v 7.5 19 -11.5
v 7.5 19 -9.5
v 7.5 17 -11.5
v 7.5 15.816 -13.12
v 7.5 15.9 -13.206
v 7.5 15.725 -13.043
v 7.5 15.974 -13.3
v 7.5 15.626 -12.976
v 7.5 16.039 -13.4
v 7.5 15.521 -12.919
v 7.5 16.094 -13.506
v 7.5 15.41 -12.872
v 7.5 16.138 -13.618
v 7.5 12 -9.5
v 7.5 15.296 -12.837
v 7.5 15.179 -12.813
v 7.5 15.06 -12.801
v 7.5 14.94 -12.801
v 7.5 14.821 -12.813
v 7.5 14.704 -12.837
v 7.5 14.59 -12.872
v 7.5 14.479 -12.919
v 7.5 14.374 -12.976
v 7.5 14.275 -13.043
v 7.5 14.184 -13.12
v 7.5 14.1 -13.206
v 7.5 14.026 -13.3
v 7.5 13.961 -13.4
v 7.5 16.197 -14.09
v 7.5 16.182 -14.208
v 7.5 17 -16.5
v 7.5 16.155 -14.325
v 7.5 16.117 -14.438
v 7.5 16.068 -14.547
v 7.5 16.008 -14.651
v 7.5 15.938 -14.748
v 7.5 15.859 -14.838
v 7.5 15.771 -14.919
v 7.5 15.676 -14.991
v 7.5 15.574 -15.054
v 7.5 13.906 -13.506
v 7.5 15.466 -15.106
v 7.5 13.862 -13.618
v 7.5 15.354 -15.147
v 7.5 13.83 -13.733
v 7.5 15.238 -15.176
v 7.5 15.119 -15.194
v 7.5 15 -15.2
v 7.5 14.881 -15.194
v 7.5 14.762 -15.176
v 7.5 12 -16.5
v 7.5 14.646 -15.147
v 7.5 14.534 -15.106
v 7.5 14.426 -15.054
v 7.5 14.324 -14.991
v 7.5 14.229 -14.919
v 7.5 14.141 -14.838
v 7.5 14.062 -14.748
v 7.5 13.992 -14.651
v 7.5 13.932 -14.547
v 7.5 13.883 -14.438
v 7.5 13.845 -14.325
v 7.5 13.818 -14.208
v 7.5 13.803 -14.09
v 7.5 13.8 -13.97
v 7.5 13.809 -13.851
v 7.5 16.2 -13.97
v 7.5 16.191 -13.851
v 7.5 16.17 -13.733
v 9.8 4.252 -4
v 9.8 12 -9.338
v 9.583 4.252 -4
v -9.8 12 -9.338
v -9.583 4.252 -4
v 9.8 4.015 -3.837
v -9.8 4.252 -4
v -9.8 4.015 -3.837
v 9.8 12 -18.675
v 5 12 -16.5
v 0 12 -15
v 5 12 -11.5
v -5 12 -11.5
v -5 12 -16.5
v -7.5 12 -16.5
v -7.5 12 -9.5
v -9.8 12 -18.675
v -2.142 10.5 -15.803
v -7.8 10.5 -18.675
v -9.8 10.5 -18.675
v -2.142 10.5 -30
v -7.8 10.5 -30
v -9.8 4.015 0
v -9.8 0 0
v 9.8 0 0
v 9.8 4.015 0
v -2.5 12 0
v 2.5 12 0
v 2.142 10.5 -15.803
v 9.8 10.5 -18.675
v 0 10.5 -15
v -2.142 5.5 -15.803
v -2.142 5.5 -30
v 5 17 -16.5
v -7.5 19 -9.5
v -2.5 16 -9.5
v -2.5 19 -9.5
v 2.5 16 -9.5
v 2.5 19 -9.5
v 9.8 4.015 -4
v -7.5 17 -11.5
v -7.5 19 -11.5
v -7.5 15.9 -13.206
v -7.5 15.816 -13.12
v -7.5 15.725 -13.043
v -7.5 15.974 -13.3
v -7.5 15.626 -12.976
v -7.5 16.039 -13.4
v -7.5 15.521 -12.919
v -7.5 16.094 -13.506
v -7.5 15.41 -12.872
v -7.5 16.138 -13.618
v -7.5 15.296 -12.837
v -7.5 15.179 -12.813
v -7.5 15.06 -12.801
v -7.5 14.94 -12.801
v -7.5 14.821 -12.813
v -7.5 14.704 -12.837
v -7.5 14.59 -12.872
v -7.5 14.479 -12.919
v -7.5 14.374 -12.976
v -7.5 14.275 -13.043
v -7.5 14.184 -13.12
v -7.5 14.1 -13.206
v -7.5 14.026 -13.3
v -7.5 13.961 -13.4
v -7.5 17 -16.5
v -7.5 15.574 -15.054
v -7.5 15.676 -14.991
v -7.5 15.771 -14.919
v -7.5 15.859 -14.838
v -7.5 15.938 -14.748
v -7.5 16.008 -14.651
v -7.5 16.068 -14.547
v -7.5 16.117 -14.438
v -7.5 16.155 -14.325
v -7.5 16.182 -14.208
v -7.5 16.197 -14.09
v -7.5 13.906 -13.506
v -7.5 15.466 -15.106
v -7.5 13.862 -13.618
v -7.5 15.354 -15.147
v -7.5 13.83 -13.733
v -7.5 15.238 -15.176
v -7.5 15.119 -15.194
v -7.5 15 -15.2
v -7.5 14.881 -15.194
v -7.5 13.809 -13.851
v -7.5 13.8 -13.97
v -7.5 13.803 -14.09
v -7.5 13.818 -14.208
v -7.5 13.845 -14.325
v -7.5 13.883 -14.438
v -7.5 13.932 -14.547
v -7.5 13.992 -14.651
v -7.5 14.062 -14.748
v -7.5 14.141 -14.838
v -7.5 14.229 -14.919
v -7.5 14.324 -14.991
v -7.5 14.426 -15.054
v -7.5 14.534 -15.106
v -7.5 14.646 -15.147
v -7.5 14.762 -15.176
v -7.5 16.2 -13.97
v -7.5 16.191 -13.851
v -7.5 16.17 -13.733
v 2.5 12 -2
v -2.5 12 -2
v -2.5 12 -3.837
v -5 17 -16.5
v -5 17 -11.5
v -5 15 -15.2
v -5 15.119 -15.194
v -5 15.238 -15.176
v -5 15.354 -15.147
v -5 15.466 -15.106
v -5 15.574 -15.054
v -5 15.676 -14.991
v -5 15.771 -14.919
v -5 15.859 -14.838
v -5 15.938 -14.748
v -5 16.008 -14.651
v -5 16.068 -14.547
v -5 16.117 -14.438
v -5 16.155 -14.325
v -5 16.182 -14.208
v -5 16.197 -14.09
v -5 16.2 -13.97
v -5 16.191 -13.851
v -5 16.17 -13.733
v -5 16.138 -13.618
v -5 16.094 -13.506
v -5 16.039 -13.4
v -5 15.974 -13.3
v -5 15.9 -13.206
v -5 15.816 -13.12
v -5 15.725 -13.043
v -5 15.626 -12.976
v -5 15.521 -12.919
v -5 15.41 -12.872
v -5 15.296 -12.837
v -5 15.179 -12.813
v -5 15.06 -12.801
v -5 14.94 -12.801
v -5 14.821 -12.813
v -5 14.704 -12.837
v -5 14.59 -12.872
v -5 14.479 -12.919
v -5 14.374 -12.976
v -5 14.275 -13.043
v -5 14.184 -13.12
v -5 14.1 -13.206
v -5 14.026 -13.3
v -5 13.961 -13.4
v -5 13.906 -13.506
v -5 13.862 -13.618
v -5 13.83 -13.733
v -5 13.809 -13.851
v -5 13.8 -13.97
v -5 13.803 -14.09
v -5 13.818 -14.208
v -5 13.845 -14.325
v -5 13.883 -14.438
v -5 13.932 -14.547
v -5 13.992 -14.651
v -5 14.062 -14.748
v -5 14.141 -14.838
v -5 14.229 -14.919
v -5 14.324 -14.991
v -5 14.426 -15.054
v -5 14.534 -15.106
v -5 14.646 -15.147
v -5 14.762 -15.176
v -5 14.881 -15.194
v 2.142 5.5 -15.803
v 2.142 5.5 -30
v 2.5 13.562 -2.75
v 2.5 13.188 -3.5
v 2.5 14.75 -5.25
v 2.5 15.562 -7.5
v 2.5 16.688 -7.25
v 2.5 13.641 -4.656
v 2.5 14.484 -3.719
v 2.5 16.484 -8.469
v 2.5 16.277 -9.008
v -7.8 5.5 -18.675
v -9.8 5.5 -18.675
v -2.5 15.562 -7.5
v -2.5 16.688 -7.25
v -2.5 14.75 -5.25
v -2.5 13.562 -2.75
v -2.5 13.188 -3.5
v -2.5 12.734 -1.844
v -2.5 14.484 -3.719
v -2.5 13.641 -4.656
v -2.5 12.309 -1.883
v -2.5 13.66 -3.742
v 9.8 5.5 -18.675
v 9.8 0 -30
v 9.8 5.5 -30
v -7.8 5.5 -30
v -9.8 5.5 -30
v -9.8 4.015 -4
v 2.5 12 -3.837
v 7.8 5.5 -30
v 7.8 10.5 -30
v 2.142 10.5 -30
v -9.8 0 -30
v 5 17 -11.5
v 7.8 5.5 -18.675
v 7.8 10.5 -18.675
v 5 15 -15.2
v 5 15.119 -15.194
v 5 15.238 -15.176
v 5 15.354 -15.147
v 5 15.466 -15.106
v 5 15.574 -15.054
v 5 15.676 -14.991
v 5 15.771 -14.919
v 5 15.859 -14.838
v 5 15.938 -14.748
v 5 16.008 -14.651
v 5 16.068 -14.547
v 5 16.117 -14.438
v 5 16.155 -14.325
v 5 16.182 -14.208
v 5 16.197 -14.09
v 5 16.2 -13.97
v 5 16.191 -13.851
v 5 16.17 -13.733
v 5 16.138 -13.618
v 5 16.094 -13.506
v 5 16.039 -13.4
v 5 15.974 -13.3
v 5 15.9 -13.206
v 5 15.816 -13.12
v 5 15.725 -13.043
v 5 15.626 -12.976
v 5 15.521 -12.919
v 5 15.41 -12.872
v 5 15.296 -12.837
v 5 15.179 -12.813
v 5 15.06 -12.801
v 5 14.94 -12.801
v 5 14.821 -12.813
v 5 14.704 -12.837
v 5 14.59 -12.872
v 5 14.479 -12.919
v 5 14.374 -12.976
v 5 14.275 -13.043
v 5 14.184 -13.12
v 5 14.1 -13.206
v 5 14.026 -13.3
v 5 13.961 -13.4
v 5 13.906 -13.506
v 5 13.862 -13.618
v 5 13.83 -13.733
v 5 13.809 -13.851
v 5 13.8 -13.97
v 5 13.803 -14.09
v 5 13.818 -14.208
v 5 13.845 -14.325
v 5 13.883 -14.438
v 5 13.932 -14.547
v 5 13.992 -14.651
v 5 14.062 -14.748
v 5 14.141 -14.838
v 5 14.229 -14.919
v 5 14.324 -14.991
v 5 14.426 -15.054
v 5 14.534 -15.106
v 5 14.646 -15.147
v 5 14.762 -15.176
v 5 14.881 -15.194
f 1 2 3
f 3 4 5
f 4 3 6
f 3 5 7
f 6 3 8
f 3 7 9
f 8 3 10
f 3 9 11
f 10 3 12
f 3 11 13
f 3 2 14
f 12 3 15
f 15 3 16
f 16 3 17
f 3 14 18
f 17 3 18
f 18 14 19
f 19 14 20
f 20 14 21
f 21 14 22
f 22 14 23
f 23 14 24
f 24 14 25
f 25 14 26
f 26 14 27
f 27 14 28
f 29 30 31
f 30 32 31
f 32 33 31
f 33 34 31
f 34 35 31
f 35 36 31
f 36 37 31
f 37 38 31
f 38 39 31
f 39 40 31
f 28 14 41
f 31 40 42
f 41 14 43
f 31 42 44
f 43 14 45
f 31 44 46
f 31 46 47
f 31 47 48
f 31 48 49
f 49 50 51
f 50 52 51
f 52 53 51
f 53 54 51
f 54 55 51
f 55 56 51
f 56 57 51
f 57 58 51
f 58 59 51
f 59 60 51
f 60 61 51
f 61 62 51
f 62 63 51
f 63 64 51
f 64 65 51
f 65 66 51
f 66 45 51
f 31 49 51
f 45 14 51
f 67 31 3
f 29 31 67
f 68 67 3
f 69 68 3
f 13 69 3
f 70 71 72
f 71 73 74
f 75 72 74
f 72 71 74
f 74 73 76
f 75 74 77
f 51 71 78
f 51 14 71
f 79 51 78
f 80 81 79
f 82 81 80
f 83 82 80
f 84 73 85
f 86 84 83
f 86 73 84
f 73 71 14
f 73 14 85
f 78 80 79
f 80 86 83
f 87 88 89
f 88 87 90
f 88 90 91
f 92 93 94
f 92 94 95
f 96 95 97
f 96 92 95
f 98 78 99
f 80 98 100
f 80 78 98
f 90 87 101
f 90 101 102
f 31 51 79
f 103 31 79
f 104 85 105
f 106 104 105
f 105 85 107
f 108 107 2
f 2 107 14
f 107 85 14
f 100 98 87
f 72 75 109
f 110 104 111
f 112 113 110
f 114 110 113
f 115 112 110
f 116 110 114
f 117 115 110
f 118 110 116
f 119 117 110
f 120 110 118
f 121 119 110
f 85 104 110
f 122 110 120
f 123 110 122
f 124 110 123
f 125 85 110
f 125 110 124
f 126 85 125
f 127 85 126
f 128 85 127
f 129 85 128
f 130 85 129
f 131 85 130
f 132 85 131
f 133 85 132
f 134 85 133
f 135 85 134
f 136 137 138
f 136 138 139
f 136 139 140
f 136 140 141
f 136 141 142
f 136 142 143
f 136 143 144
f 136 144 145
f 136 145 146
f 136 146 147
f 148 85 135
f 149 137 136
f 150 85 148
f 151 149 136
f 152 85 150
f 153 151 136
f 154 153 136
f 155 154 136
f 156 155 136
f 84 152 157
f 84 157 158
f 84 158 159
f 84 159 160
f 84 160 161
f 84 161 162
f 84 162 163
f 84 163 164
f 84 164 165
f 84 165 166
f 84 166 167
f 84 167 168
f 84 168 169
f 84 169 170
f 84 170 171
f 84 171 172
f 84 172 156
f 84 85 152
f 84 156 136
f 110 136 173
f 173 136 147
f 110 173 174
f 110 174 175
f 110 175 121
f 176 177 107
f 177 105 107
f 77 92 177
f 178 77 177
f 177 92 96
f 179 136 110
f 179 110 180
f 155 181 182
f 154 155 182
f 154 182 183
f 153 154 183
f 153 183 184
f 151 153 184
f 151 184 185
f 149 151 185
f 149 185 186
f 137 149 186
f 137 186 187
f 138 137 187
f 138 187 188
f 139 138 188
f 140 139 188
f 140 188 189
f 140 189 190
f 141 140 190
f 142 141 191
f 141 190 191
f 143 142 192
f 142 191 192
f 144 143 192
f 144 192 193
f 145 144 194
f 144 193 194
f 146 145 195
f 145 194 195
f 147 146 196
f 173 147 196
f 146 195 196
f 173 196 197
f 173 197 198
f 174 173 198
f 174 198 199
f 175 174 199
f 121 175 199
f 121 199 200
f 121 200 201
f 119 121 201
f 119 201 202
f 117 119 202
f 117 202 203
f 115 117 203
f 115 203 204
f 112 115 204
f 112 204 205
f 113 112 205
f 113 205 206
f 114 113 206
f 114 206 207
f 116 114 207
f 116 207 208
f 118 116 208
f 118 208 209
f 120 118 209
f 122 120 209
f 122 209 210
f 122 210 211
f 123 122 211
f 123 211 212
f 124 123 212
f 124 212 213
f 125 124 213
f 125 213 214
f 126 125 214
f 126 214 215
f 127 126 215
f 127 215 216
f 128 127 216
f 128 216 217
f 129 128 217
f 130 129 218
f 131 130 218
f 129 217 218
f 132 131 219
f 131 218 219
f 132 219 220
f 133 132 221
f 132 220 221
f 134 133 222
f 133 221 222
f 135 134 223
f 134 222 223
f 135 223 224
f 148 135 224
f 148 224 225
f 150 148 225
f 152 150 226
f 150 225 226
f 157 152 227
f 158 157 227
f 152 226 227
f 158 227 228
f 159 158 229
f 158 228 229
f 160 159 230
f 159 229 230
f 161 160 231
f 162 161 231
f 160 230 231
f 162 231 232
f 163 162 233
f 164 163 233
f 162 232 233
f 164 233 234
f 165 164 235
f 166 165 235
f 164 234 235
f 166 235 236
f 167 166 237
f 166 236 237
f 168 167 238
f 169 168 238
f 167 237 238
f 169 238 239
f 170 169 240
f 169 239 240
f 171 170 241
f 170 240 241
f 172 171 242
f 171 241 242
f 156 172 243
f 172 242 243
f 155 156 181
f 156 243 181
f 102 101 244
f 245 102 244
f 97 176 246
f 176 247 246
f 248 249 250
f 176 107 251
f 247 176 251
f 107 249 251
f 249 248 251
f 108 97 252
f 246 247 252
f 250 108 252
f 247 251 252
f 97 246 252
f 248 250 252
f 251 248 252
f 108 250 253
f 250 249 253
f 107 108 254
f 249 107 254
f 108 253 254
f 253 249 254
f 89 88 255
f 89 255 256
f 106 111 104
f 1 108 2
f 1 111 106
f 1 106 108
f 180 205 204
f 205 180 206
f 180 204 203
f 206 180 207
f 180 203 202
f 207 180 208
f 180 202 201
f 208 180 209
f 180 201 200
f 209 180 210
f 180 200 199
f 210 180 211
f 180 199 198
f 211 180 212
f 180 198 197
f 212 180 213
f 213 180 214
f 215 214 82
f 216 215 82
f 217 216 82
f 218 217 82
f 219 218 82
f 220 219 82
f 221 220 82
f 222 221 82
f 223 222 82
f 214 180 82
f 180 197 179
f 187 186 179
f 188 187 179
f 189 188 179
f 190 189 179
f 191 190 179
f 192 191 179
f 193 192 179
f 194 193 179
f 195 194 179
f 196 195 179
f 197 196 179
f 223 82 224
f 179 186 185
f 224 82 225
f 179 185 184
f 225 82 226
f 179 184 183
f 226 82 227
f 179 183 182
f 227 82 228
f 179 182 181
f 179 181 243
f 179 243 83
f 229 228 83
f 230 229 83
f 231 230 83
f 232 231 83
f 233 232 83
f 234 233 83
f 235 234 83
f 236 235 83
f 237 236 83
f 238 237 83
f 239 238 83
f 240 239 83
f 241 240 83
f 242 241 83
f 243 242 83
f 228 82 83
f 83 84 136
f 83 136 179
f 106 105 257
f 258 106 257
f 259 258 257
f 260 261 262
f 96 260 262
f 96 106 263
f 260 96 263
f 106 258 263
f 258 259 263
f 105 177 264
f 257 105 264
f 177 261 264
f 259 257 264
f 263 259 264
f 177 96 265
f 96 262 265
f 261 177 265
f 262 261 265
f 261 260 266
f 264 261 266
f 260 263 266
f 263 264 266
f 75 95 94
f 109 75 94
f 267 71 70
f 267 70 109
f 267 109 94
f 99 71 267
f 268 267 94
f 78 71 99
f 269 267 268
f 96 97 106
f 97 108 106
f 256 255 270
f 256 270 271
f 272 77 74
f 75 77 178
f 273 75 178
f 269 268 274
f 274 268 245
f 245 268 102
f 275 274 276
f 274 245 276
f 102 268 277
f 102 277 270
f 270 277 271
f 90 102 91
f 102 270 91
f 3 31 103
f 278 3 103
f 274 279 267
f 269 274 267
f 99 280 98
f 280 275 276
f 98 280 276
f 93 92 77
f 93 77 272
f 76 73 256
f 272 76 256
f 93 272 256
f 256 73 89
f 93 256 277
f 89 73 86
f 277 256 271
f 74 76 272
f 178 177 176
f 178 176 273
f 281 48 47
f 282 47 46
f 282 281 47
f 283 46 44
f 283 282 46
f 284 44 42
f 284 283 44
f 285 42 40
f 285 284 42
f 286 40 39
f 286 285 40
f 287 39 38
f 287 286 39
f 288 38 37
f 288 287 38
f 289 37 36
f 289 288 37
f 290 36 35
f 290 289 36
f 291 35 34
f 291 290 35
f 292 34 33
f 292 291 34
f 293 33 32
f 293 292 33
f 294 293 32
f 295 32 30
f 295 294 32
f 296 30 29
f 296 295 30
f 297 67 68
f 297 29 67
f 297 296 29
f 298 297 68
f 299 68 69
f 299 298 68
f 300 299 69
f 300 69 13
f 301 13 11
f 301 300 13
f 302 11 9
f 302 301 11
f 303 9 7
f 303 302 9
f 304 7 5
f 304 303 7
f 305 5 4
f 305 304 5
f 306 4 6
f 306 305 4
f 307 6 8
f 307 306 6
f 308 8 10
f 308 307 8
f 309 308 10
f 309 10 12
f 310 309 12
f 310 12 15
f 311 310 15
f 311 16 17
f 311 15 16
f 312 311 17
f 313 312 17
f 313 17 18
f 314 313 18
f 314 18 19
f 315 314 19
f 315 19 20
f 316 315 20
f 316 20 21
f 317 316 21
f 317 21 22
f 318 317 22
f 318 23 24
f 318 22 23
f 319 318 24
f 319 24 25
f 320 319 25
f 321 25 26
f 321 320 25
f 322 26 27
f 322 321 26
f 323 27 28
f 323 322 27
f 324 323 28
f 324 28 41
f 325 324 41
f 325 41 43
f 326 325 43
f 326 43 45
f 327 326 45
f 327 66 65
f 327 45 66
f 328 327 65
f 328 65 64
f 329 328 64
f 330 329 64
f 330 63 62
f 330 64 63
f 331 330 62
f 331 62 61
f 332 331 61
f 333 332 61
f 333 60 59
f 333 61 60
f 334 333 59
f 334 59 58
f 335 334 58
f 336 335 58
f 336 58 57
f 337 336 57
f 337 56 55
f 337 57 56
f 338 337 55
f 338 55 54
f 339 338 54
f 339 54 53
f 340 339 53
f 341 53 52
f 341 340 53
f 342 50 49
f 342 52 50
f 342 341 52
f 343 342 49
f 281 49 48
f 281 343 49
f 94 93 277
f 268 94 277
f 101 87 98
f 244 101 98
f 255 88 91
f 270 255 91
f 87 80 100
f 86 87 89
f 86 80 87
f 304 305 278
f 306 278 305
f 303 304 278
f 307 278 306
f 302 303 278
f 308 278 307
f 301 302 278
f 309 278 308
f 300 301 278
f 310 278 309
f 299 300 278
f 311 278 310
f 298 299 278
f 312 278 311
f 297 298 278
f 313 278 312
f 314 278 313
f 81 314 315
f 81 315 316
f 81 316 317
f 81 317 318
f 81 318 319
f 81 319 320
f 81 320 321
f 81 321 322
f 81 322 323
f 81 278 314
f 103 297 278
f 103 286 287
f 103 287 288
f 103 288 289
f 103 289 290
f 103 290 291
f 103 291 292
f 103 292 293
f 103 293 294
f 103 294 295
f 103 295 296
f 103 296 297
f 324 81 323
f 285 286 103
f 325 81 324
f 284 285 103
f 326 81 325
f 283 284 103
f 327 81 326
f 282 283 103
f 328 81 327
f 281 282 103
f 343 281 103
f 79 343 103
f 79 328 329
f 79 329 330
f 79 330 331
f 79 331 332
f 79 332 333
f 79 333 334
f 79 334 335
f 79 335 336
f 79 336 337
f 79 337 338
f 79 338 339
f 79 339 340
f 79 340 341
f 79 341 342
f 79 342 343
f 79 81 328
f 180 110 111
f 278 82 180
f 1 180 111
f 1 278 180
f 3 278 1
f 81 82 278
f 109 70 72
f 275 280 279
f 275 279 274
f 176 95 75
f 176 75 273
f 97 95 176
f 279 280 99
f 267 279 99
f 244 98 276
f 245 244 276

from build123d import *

# Parameters (mm, degrees)
BOSS_EXTRUDE2_DEPTH      = 10
BOSS_EXTRUDE2_DEPTH_BACK = 10
SKETCH2_W                = 30
SKETCH2_H                = 12
SKETCH11_W               = 2.5
SKETCH11_H               = 5
BOSS_EXTRUDE5_DEPTH      = 5
SKETCH12_R               = 1.2
CUT_EXTRUDE3_DEPTH       = 5
SKETCH13_W               = 15
SKETCH13_H               = 2
BOSS_EXTRUDE6_DEPTH      = 7
SKETCH16_W               = 30
SKETCH16_H               = 12
CUT_EXTRUDE4_DEPTH       = 0.2
CUT_EXTRUDE5_DEPTH       = 1.5
CUT_EXTRUDE6_DEPTH       = 31
SKETCH23_W               = 4.283577098
SKETCH23_H               = 14.196829294
CUT_EXTRUDE7_DEPTH       = 5
SKETCH24_W               = 2
SKETCH24_H               = 11.325
CUT_EXTRUDE8_DEPTH       = 5
CUT_EXTRUDE9_DEPTH       = 4


with BuildPart() as part:
    # Sketch2 → Boss-Extrude2 (new, two sides: drawn at the far end of the back side and taken through both)
    with BuildSketch(Plane(origin=(0, 0, 0), x_dir=(0, 0, -1), z_dir=(1, 0, 0)).offset(-BOSS_EXTRUDE2_DEPTH_BACK)):
        with Locations((15, 6)):
            Rectangle(SKETCH2_W, SKETCH2_H)
    extrude(amount=BOSS_EXTRUDE2_DEPTH + BOSS_EXTRUDE2_DEPTH_BACK)

    # Sketch11 → Boss-Extrude5 (add)
    with BuildSketch(Plane(origin=(0, 12, 0), x_dir=(1, 0, 0), z_dir=(0, 1, 0))):
        with Locations((-6.25, 14)):
            Rectangle(SKETCH11_W, SKETCH11_H)
    boss_extrude5 = extrude(amount=BOSS_EXTRUDE5_DEPTH)

    # Sketch12 → Cut-Extrude3 (cut)
    with BuildSketch(Plane(origin=(-5, 0, 0), x_dir=(0, 0, -1), z_dir=(1, 0, 0))):
        with Locations((14, 15)):
            Circle(SKETCH12_R)
    cut_extrude3 = extrude(amount=-CUT_EXTRUDE3_DEPTH, mode=Mode.SUBTRACT)

    # Mirror2: Boss-Extrude5, Cut-Extrude3 across plane
    add(boss_extrude5.mirror(Plane.ZY))
    add(cut_extrude3.mirror(Plane.ZY), mode=Mode.SUBTRACT)

    # Sketch13 → Boss-Extrude6 (add)
    with BuildSketch(Plane(origin=(0, 12, 0), x_dir=(1, 0, 0), z_dir=(0, 1, 0))):
        with Locations((0, 10.5)):
            Rectangle(SKETCH13_W, SKETCH13_H)
    extrude(amount=BOSS_EXTRUDE6_DEPTH)

    # Sketch16 → Cut-Extrude4 (cut)
    with BuildSketch(Plane(origin=(10, 0, 0), x_dir=(0, 0, -1), z_dir=(1, 0, 0))):
        with Locations((15, 6)):
            Rectangle(SKETCH16_W, SKETCH16_H)
    cut_extrude4 = extrude(amount=-CUT_EXTRUDE4_DEPTH, mode=Mode.SUBTRACT)

    # Mirror3: Cut-Extrude4 across plane
    add(cut_extrude4.mirror(Plane.ZY), mode=Mode.SUBTRACT)

    # Sketch5 → Cut-Extrude5 (cut)
    with BuildSketch(Plane(origin=(0, 12, 0), x_dir=(1, 0, 0), z_dir=(0, 1, 0))):
        Polygon((-10, 18.75), (-10, 30), (10, 30), (10, 18.75), (0, 15), align=None)
    extrude(amount=-CUT_EXTRUDE5_DEPTH, mode=Mode.SUBTRACT)

    # Sketch20 → Loft1 section 0
    with BuildSketch(Plane(origin=(0, 12, 0), x_dir=(1, 0, 0), z_dir=(0, 1, 0))):
        with BuildLine():
            Line((-2.5, 2), (2.5, 2))
            Line((2.5, 2), (2.5, 0))
            Line((2.5, 0), (-2.5, 0))
            Line((-2.5, 0), (-2.5, 2))
        make_face()
    # Sketch19 → Loft1 section 1
    with BuildSketch(Plane.XY.offset(-9.5)):
        with BuildLine():
            Line((2.5, 16), (-2.5, 16))
            Line((-2.5, 16), (-2.5, 19))
            Line((-2.5, 19), (2.5, 19))
            Line((2.5, 19), (2.5, 16))
        make_face()
    loft()

    # Sketch22 → Cut-Extrude6 (cut)
    with BuildSketch(Plane.ZY.offset(9.8)):
        Polygon((-9.3375, 12), (-3.836516703, 4.014793252), (-3.836516703, 12), align=None)
    extrude(amount=-CUT_EXTRUDE6_DEPTH, mode=Mode.SUBTRACT)

    # Sketch23 → Cut-Extrude7 (cut)
    with BuildSketch(Plane(origin=(0, 10.5, 0), x_dir=(1, 0, 0), z_dir=(0, 1, 0))):
        with Locations((0, 22.901585353)):
            Rectangle(SKETCH23_W, SKETCH23_H)
    extrude(amount=-CUT_EXTRUDE7_DEPTH, mode=Mode.SUBTRACT)

    # Sketch24 → Cut-Extrude8 (cut)
    with BuildSketch(Plane(origin=(0, 10.5, 0), x_dir=(1, 0, 0), z_dir=(0, 1, 0))):
        with Locations((8.8, 24.3375)):
            Rectangle(SKETCH24_W, SKETCH24_H)
    cut_extrude8 = extrude(amount=-CUT_EXTRUDE8_DEPTH, mode=Mode.SUBTRACT)

    # Mirror4: Cut-Extrude8 across plane
    add(cut_extrude8.mirror(Plane.ZY), mode=Mode.SUBTRACT)

    # Sketch25 → Cut-Extrude9 (cut)
    with BuildSketch(Plane.XY):
        Polygon((-9.8, 12), (-9.8, 4.014793252), (-2.5, 12), align=None)
    cut_extrude9 = extrude(amount=-CUT_EXTRUDE9_DEPTH, mode=Mode.SUBTRACT)

    # Mirror5: Cut-Extrude9 across plane
    add(cut_extrude9.mirror(Plane.ZY), mode=Mode.SUBTRACT)


solid = part.part
